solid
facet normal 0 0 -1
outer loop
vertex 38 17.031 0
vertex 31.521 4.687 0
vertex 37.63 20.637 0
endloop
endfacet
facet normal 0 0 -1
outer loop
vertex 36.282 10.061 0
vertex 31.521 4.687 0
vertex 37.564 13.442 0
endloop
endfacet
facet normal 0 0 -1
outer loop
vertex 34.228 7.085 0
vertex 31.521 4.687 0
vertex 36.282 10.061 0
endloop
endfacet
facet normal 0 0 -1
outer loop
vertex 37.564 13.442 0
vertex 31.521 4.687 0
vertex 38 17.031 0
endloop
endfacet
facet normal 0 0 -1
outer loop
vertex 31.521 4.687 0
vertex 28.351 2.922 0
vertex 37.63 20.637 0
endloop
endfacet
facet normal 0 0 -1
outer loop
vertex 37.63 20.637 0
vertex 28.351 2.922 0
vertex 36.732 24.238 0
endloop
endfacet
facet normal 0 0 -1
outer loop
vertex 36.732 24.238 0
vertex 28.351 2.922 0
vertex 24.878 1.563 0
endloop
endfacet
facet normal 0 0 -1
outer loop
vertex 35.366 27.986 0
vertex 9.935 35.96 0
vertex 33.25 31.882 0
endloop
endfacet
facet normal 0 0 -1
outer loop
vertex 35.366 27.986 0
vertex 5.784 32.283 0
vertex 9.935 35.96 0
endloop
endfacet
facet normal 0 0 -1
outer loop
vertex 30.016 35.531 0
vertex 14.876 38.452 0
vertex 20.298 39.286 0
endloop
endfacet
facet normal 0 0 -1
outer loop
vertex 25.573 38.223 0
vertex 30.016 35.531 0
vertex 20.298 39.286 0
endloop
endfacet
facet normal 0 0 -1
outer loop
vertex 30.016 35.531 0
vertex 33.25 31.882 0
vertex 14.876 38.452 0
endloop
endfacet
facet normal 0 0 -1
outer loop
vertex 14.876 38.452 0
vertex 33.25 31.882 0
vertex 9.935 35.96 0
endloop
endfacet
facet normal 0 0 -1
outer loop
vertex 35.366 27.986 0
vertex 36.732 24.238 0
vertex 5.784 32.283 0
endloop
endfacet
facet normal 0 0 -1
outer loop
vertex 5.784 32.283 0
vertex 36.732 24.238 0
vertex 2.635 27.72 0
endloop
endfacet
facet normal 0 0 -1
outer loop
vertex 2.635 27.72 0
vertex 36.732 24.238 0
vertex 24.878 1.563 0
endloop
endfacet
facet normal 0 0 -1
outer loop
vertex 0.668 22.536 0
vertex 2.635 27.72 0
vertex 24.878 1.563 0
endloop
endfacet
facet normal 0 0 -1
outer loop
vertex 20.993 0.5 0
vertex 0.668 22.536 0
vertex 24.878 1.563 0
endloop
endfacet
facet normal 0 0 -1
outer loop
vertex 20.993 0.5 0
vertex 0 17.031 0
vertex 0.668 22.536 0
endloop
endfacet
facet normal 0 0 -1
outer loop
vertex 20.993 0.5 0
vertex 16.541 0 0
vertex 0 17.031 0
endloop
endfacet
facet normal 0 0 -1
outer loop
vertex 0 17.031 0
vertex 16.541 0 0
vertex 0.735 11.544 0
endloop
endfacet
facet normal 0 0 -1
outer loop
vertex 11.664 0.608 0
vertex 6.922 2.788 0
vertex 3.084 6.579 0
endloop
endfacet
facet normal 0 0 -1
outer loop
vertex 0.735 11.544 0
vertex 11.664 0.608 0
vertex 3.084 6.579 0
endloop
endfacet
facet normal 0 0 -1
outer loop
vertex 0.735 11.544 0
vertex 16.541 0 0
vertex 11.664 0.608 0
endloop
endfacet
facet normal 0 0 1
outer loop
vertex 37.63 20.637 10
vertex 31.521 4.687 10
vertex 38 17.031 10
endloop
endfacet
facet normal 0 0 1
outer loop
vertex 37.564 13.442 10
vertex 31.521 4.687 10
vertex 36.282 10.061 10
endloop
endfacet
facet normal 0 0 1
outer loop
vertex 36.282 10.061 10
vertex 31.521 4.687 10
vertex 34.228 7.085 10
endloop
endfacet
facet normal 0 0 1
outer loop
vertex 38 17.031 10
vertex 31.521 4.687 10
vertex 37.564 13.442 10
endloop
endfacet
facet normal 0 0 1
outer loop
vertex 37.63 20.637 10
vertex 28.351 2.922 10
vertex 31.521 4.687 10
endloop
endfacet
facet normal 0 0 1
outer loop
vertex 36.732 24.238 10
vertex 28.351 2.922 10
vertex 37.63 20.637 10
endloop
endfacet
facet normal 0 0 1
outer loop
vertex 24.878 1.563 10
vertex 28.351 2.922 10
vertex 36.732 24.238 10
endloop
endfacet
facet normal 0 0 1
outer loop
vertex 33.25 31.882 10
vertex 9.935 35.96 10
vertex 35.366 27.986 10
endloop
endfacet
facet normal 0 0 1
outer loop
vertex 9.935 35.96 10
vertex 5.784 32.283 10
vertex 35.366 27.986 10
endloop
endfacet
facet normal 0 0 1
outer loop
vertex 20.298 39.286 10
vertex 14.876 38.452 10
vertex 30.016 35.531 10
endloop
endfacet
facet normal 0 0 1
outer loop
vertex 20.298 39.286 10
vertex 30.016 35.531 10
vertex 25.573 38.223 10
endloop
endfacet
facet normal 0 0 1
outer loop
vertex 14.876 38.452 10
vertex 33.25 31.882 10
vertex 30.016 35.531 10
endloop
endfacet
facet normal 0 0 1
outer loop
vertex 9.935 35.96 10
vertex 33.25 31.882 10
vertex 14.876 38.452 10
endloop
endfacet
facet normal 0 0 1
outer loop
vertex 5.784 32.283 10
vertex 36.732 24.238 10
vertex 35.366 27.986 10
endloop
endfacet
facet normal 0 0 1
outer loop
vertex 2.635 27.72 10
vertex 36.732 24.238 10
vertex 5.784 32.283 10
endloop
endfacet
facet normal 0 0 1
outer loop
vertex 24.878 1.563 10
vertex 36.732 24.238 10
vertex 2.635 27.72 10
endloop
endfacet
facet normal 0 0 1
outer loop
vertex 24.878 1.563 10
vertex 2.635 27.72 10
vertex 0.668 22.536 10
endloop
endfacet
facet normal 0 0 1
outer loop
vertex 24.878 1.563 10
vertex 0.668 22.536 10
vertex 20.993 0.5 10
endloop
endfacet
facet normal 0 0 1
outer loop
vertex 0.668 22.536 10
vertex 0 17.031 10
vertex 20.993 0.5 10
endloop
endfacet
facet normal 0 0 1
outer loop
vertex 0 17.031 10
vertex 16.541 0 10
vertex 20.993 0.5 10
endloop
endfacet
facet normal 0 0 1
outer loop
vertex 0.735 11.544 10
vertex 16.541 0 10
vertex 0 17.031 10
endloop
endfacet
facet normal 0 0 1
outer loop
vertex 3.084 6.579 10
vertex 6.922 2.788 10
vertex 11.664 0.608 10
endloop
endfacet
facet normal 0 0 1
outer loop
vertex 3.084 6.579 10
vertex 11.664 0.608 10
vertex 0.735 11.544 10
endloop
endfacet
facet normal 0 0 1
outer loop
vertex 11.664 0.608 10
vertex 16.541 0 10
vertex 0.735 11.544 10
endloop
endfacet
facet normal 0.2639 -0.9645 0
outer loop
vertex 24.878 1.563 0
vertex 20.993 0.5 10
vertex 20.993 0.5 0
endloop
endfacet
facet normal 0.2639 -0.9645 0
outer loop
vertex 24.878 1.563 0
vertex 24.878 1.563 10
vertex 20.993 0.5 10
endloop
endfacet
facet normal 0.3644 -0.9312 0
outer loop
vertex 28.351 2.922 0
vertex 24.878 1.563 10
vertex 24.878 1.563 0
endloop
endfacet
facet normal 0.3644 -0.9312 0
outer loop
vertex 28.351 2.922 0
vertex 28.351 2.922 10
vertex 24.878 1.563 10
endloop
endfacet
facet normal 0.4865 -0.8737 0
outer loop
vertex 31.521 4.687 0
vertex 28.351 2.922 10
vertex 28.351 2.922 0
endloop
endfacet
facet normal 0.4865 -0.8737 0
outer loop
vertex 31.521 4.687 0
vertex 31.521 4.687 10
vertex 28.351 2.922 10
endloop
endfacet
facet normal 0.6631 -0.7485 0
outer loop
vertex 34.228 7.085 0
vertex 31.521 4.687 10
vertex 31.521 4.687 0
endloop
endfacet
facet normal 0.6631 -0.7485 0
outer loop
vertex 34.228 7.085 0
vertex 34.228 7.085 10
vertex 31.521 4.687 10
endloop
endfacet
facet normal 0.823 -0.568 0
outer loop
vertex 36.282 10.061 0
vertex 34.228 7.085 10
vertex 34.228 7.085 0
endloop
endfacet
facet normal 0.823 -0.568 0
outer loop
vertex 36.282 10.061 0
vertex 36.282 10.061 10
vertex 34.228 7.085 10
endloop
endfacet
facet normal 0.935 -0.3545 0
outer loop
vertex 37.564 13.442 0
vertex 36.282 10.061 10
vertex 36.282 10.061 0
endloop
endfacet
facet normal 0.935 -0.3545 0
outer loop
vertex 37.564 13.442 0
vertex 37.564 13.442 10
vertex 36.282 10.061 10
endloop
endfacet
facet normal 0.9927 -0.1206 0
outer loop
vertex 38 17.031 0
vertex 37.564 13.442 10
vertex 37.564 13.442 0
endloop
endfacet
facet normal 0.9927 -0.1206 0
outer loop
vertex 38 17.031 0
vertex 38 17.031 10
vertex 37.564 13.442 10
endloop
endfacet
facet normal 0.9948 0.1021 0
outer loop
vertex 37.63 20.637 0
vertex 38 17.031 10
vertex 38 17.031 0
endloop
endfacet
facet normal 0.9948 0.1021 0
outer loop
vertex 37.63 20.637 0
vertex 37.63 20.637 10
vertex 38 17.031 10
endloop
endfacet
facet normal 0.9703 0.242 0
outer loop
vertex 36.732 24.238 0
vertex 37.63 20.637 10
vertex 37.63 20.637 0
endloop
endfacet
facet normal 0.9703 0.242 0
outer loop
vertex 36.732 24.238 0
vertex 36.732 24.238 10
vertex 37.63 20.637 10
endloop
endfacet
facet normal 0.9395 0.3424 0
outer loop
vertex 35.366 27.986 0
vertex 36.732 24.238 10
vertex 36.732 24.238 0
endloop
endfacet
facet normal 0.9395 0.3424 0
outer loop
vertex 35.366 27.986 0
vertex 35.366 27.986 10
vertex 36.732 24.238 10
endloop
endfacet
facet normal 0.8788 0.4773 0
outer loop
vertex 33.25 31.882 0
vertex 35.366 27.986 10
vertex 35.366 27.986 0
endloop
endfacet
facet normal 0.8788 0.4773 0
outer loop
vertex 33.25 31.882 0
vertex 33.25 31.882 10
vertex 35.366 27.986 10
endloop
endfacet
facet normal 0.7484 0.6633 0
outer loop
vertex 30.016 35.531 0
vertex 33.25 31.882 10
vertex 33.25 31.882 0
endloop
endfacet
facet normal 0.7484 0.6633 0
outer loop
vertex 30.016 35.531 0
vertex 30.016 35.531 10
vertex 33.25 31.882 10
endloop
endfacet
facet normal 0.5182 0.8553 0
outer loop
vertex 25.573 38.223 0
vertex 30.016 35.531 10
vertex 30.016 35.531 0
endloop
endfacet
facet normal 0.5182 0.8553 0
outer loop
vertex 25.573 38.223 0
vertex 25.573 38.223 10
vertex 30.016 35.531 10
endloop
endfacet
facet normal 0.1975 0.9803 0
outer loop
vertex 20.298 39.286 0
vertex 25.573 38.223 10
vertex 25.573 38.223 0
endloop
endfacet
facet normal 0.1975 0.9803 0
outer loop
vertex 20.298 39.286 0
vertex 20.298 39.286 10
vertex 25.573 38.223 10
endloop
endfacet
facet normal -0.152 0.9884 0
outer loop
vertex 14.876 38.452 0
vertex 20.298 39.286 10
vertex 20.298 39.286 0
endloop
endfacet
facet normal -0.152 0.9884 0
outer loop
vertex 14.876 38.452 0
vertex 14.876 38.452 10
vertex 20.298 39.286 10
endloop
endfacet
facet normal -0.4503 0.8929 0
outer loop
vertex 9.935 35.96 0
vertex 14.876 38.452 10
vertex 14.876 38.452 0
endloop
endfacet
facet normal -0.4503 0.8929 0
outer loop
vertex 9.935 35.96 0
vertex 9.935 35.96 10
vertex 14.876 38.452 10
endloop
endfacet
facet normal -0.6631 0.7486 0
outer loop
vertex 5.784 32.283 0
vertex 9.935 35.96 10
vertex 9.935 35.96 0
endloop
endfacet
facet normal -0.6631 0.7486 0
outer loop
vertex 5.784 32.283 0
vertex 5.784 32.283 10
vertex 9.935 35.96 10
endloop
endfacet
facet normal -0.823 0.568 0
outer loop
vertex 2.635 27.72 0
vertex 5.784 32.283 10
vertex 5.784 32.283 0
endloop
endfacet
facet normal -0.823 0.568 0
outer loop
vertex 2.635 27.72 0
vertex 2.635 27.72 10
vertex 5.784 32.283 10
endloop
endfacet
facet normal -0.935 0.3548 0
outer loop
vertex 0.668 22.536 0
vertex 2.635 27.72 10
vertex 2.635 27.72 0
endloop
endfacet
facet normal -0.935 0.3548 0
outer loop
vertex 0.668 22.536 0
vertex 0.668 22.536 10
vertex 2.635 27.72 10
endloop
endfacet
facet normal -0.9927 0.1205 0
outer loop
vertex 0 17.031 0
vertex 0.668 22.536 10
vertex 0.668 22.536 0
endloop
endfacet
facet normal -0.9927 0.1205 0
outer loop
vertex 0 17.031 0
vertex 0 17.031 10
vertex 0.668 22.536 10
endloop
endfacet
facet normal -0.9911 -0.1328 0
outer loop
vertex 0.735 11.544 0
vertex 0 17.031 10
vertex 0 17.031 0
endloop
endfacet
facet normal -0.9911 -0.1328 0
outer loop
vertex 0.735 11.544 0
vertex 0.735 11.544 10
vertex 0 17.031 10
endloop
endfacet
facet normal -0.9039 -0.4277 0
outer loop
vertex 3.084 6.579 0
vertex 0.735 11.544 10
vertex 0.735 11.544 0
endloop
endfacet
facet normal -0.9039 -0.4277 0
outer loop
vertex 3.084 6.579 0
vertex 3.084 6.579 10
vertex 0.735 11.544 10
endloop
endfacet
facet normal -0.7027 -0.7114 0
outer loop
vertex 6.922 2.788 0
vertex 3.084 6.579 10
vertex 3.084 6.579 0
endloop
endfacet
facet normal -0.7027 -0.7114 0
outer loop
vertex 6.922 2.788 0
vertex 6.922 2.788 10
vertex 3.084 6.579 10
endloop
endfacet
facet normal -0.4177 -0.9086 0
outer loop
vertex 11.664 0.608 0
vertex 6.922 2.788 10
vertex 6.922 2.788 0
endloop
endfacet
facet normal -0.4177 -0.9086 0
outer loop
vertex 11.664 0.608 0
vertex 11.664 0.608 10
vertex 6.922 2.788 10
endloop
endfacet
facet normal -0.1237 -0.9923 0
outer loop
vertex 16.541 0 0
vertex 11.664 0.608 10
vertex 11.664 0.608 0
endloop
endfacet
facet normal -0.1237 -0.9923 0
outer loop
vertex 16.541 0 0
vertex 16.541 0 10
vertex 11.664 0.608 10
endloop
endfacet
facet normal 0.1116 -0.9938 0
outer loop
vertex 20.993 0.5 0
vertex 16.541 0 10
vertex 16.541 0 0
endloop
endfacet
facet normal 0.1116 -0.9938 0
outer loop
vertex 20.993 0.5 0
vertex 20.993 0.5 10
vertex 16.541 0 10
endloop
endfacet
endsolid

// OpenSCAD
$fn = 32;

// ----------------------------------------------------------------------
// Cam disc: base radius 15.0 mm, lift 8.0 mm, 26 profile points
// ----------------------------------------------------------------------

// --- parameters (mm) ---
profile_height = 10;      // extrusion height
profile_points = 26;      // points of the closed outline

profile = [[38, 17.031], [37.63, 20.637], [36.732, 24.238], [35.366, 27.986], [33.25, 31.882], [30.016, 35.531], [25.573, 38.223], [20.298, 39.286], [14.876, 38.452], [9.935, 35.96], [5.784, 32.283], [2.635, 27.72], [0.668, 22.536], [0, 17.031], [0.735, 11.544], [3.084, 6.579], [6.922, 2.788], [11.664, 0.608], [16.541, 0], [20.993, 0.5], [24.878, 1.563], [28.351, 2.922], [31.521, 4.687], [34.228, 7.085], [36.282, 10.061], [37.564, 13.442]];  // single closed polygon, 26 points, counter clockwise

// --- the one profile operation ---
linear_extrude(height = profile_height) polygon(points = profile);
